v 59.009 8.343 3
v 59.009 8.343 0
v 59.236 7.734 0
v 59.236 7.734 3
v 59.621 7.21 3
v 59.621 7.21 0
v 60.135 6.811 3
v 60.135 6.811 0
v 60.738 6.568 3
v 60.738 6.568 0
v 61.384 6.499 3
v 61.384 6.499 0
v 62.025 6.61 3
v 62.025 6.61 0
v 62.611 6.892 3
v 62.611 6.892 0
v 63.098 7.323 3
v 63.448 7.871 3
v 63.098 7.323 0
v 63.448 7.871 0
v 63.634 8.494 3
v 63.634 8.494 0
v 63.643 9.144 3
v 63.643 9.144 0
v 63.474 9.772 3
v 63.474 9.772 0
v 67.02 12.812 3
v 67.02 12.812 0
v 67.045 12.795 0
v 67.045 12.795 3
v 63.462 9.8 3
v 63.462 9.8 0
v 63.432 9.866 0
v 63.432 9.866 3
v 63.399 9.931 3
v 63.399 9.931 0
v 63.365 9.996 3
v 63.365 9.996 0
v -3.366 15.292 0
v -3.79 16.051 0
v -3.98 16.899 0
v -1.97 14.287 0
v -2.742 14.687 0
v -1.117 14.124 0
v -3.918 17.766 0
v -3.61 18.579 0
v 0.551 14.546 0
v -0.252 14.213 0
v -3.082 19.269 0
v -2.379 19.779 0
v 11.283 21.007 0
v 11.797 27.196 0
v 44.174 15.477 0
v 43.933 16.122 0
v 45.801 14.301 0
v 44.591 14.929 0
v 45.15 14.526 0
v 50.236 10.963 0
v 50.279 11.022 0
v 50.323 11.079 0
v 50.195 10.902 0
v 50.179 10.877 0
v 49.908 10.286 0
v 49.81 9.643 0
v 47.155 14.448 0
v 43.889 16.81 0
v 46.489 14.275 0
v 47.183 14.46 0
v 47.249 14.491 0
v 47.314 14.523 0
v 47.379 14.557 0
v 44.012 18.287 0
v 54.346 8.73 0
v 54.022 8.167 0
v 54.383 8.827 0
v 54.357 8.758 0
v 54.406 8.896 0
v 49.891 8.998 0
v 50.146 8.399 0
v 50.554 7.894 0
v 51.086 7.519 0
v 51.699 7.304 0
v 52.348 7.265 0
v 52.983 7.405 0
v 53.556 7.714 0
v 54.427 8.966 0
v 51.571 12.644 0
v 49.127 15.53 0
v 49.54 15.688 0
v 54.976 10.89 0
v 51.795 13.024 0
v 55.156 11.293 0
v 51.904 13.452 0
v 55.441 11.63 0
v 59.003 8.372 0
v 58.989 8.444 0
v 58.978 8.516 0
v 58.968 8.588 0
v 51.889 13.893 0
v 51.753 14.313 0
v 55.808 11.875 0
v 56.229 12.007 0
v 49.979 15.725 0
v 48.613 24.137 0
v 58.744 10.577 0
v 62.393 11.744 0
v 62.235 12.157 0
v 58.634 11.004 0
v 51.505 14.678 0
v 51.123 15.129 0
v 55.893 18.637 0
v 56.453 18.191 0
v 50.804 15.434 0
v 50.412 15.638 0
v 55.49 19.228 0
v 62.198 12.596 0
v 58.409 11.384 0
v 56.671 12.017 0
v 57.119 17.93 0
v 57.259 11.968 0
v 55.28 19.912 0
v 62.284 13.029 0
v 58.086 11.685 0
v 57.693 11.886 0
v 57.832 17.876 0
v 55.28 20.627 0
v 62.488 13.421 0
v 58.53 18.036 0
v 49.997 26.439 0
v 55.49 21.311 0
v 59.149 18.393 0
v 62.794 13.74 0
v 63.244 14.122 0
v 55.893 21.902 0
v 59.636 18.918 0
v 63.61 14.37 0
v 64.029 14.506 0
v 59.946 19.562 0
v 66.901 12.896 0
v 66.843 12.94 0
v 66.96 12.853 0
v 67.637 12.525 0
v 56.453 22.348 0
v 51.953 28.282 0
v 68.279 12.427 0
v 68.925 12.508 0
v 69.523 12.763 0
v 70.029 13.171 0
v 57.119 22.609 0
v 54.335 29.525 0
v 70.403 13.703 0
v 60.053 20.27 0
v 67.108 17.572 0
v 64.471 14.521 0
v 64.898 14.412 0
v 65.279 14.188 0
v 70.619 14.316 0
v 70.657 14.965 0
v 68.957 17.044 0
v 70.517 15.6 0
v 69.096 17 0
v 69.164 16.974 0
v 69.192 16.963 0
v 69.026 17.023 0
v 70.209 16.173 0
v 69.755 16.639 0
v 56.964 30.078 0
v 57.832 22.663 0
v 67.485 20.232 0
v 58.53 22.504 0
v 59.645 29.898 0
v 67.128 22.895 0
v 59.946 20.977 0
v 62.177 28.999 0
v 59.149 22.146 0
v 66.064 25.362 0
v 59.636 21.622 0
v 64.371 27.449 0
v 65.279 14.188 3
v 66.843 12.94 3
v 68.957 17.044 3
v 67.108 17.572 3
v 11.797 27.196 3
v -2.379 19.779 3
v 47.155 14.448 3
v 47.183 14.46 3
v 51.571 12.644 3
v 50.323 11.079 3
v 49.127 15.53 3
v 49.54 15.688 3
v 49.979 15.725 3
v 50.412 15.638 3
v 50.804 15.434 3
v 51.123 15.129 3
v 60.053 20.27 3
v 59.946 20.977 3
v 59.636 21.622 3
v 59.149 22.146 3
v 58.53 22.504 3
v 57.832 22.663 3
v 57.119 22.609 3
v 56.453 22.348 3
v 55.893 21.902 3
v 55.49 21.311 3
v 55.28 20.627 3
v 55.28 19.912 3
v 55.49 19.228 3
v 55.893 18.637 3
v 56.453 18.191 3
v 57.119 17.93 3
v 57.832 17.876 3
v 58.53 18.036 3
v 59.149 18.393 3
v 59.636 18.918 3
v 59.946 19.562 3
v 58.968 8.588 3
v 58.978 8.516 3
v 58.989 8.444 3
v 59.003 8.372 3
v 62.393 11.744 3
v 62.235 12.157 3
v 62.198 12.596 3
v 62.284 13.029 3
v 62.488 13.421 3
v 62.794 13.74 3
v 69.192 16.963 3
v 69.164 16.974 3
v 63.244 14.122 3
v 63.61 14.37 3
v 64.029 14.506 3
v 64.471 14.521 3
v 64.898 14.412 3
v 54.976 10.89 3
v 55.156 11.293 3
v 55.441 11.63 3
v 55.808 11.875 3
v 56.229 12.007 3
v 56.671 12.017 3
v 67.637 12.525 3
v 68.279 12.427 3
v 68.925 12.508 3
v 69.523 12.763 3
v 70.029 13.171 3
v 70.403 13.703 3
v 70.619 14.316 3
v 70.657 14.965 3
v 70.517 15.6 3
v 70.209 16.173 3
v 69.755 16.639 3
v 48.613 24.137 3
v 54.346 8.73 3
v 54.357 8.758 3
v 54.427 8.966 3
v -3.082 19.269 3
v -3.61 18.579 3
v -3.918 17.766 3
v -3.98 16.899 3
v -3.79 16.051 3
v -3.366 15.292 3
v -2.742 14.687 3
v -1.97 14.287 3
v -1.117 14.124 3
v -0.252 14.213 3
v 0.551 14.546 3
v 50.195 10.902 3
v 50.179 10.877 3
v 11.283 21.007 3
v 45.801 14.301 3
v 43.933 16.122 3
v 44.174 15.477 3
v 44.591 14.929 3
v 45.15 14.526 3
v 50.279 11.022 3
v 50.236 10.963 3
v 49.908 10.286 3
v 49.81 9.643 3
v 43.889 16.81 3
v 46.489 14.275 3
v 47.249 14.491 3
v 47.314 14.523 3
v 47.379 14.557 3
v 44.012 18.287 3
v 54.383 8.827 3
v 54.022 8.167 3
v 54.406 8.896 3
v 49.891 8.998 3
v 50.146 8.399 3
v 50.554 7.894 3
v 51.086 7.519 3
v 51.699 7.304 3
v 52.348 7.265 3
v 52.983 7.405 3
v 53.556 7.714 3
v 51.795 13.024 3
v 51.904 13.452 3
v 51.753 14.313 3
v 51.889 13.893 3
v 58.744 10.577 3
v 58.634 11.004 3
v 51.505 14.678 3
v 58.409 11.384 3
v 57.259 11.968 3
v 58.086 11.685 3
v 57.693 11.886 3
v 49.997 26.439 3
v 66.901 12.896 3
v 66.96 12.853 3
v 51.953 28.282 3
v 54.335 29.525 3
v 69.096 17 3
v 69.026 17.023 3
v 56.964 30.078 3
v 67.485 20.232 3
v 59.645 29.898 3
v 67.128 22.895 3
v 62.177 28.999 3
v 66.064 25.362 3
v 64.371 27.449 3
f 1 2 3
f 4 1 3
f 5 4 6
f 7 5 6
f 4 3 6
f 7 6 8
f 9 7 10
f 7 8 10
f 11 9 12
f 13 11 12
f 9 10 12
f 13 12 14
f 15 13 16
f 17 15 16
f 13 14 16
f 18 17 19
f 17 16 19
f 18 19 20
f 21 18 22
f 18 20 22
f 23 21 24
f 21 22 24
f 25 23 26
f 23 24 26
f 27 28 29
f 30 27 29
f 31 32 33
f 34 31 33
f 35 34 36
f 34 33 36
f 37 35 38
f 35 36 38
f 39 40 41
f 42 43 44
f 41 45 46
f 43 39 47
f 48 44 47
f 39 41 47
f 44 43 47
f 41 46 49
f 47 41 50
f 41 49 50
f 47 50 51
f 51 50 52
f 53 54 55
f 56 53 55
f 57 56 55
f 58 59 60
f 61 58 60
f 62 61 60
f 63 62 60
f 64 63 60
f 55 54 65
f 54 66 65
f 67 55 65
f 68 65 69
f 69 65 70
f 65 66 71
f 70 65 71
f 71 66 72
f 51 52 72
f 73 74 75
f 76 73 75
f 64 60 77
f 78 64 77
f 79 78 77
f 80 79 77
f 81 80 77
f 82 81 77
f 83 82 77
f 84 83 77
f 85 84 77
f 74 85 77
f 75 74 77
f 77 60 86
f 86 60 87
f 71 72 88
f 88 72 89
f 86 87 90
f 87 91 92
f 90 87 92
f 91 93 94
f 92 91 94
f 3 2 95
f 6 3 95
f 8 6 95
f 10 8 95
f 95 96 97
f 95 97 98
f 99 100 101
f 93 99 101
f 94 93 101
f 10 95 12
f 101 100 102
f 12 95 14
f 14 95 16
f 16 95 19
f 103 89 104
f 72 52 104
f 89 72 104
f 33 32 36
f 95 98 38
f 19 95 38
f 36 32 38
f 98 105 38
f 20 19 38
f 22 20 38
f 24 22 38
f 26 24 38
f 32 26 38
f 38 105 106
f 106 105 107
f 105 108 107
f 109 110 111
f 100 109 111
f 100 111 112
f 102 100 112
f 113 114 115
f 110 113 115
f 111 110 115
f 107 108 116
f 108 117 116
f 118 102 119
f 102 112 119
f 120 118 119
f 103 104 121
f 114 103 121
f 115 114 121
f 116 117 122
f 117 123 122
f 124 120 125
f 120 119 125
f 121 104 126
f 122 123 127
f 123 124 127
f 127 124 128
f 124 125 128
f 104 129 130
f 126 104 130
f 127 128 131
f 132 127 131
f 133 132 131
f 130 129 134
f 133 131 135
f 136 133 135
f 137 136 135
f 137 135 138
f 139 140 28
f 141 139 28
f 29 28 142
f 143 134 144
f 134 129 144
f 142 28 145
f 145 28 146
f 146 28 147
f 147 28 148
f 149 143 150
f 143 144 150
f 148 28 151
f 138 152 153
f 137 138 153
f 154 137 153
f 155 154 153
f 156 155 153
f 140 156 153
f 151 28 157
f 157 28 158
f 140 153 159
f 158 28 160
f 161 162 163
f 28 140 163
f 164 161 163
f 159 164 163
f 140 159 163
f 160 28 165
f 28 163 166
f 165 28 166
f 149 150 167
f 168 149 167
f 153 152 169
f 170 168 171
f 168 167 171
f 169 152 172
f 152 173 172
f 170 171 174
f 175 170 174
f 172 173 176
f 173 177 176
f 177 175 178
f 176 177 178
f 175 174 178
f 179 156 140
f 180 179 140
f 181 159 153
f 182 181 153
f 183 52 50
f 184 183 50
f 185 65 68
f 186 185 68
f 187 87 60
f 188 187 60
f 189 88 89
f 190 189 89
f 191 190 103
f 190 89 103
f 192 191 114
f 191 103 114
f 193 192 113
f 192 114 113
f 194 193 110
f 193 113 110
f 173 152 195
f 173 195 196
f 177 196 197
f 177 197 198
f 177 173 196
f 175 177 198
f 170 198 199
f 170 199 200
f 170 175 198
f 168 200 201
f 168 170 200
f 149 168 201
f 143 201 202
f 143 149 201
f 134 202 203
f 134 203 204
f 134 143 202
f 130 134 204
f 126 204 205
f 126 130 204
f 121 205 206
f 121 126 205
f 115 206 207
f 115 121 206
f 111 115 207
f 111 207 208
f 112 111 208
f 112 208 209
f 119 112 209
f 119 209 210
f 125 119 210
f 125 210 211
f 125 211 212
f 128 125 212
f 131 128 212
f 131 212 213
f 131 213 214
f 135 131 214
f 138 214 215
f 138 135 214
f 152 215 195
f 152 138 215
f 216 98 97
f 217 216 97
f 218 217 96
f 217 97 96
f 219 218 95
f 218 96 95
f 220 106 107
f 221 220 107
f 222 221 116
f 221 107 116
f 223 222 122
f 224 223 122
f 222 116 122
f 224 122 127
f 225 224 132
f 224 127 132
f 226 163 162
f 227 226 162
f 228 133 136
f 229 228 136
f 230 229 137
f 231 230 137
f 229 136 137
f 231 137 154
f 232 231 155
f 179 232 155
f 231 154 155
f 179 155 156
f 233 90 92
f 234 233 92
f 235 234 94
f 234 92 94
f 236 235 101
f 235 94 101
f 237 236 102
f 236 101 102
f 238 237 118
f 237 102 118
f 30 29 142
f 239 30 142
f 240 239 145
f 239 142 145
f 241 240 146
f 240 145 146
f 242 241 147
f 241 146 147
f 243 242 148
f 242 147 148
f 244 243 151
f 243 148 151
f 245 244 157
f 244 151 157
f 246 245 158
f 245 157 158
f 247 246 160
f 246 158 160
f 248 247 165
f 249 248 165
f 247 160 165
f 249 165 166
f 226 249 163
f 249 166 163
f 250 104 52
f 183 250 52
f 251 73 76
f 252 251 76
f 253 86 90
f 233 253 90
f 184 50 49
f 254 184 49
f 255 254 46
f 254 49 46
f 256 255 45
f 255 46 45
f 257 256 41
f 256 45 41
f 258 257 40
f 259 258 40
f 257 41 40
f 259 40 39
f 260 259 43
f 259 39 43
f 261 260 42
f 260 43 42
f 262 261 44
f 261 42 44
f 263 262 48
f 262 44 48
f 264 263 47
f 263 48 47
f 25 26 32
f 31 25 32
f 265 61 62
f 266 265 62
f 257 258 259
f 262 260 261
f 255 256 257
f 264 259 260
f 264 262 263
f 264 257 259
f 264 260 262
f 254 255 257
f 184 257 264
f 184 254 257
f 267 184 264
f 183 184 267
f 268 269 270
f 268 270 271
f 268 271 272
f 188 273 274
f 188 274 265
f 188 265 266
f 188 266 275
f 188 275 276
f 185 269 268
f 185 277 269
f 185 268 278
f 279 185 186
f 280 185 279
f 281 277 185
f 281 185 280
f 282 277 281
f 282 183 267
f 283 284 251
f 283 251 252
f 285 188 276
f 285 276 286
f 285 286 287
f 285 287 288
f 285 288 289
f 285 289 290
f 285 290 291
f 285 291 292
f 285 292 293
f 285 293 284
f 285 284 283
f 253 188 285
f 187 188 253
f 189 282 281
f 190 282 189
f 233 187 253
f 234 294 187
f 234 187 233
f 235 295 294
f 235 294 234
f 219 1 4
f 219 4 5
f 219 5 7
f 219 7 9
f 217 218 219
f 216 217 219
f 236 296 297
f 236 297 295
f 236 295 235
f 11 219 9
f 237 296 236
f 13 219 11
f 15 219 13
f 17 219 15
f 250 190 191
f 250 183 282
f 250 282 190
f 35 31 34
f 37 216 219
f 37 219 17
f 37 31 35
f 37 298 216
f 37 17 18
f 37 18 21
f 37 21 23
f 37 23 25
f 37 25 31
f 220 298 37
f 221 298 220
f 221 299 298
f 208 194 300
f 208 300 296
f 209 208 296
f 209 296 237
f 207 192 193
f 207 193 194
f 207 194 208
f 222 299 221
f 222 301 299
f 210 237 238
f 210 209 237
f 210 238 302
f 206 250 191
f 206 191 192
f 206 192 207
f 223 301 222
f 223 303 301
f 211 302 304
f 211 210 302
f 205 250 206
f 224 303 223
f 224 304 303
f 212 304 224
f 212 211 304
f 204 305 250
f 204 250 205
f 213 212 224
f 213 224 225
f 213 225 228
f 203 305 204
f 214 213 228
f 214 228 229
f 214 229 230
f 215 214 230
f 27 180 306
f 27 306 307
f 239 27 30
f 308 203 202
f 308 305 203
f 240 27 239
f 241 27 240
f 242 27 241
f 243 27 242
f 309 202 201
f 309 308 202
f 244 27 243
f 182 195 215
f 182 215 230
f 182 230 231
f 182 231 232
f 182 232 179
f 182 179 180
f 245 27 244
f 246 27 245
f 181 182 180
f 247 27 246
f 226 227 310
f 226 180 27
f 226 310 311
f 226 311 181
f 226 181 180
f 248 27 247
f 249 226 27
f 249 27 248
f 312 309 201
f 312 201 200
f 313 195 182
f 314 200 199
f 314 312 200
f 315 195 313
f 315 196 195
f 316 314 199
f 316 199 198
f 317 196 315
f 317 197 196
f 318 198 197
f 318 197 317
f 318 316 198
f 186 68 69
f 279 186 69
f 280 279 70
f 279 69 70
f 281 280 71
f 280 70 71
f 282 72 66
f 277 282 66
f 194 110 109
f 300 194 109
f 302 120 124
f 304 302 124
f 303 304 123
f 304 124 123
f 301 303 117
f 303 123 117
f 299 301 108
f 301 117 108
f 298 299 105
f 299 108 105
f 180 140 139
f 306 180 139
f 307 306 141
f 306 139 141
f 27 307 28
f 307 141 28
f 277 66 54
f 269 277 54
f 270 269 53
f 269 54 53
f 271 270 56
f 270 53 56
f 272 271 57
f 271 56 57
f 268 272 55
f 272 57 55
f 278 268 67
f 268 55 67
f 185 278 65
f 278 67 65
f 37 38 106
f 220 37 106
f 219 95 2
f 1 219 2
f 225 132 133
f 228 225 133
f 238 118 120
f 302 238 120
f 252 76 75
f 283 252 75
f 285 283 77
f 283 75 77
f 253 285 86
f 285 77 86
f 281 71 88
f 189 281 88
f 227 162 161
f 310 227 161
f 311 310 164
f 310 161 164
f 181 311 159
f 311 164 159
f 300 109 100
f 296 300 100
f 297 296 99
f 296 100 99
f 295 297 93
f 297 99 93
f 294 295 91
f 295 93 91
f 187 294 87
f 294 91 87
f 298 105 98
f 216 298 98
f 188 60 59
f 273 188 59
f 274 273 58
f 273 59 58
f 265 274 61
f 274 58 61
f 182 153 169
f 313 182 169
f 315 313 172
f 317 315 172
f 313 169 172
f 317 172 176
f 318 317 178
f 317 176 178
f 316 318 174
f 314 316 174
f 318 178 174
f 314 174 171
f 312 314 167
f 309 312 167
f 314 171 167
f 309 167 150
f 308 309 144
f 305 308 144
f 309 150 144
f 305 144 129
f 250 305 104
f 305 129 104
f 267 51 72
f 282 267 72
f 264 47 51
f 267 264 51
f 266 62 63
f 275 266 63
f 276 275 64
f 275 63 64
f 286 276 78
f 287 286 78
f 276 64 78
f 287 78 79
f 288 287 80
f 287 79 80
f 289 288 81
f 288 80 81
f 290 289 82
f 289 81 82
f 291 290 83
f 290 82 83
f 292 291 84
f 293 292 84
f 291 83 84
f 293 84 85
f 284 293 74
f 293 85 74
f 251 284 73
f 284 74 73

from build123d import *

# Parameters (mm, degrees)
MODEL_R                 = 2.4
SALIENTE_EXTRUIR1_DEPTH = 3


with BuildPart() as part:
    # Model → Saliente-Extruir1 (new body)
    with BuildSketch(Plane.XY):
        with BuildLine():
            Line((0.550846874, 14.545911472), (11.282662542, 21.007019657))
            Line((11.282662542, 21.007019657), (44.011748182, 18.287442361))
            Line((44.011748182, 18.287442361), (43.888957319, 16.809700693))
            ThreePointArc((43.888957319, 16.809700693), (44.855654521, 14.707163158), (47.155246022, 14.448229776))
            Line((47.155246022, 14.448229776), (47.182889346, 14.460182921))
            ThreePointArc((47.182889346, 14.460182921), (47.281916988, 14.506531358), (47.378685576, 14.557428234))
            Line((47.378685576, 14.557428234), (49.127384749, 15.529685066))
            ThreePointArc((49.127384749, 15.529685066), (50.19897968, 15.696696011), (51.122983719, 15.128871311))
            Line((51.122983719, 15.128871311), (51.504698759, 14.677971297))
            ThreePointArc((51.504698759, 14.677971297), (51.91223143, 13.672921311), (51.570646763, 12.643587416))
            Line((51.570646763, 12.643587416), (50.323105233, 11.079339262))
            ThreePointArc((50.323105233, 11.079339262), (50.256934954, 10.992298205), (50.194877883, 10.902278366))
            Line((50.194877883, 10.902278366), (50.178526203, 10.876986992))
            ThreePointArc((50.178526203, 10.876986992), (51.085631167, 7.518902031), (54.34625878, 8.730463665))
            Line((54.34625878, 8.730463665), (54.357353411, 8.758462597))
            ThreePointArc((54.357353411, 8.758462597), (54.394603234, 8.861259009), (54.427039433, 8.965674259))
            Line((54.427039433, 8.965674259), (54.976067079, 10.889680702))
            ThreePointArc((54.976067079, 10.889680702), (55.61570455, 11.765507317), (56.670586767, 12.017364142))
            Line((56.670586767, 12.017364142), (57.259334518, 11.968442975))
            ThreePointArc((57.259334518, 11.968442975), (58.258181294, 11.54593443), (58.744493436, 10.576548618))
            Line((58.744493436, 10.576548618), (58.96843884, 8.588313067))
            ThreePointArc((58.96843884, 8.588313067), (58.983196709, 8.479976292), (59.002969372, 8.372441678))
            Line((59.002969372, 8.372441678), (59.00929069, 8.342995592))
            ThreePointArc((59.00929069, 8.342995592), (62.025235409, 6.609891015), (63.474143857, 9.772206359))
            Line((63.474143857, 9.772206359), (63.462190711, 9.799849683))
            ThreePointArc((63.462190711, 9.799849683), (63.415842275, 9.898877325), (63.364945399, 9.995645912))
            Line((63.364945399, 9.995645912), (62.392688567, 11.744345086))
            ThreePointArc((62.392688567, 11.744345086), (62.225677622, 12.815940017), (62.793502322, 13.739944056))
            Line((62.793502322, 13.739944056), (63.244402336, 14.121659096))
            ThreePointArc((63.244402336, 14.121659096), (64.249452322, 14.529191767), (65.278786217, 14.187607099))
            Line((65.278786217, 14.187607099), (66.843034372, 12.940065573))
            ThreePointArc((66.843034372, 12.940065573), (66.930075429, 12.873895294), (67.020095268, 12.811838223))
            Line((67.020095268, 12.811838223), (67.045386643, 12.795486542))
            ThreePointArc((67.045386643, 12.795486542), (70.403471604, 13.702591507), (69.191909969, 16.963219119))
            Line((69.191909969, 16.963219119), (69.163911037, 16.974313751))
            ThreePointArc((69.163911037, 16.974313751), (69.061114626, 17.011563574), (68.956699375, 17.043999773))
            Line((68.956699375, 17.043999773), (67.107784068, 17.571599676))
            ThreePointArc((67.107784068, 17.571599676), (60.941730208, 29.535754633), (48.612503883, 24.136550776))
            Line((48.612503883, 24.136550776), (11.796901511, 27.195691428))
            Line((11.796901511, 27.195691428), (-2.378510761, 19.779467823))
            ThreePointArc((-2.378510761, 19.779467823), (-3.605636909, 15.656016384), (0.550846874, 14.545911472))
        make_face()
        with Locations((57.652706647, 20.269666987)):
            Circle(MODEL_R, mode=Mode.SUBTRACT)
    extrude(amount=SALIENTE_EXTRUIR1_DEPTH)


solid = part.part
